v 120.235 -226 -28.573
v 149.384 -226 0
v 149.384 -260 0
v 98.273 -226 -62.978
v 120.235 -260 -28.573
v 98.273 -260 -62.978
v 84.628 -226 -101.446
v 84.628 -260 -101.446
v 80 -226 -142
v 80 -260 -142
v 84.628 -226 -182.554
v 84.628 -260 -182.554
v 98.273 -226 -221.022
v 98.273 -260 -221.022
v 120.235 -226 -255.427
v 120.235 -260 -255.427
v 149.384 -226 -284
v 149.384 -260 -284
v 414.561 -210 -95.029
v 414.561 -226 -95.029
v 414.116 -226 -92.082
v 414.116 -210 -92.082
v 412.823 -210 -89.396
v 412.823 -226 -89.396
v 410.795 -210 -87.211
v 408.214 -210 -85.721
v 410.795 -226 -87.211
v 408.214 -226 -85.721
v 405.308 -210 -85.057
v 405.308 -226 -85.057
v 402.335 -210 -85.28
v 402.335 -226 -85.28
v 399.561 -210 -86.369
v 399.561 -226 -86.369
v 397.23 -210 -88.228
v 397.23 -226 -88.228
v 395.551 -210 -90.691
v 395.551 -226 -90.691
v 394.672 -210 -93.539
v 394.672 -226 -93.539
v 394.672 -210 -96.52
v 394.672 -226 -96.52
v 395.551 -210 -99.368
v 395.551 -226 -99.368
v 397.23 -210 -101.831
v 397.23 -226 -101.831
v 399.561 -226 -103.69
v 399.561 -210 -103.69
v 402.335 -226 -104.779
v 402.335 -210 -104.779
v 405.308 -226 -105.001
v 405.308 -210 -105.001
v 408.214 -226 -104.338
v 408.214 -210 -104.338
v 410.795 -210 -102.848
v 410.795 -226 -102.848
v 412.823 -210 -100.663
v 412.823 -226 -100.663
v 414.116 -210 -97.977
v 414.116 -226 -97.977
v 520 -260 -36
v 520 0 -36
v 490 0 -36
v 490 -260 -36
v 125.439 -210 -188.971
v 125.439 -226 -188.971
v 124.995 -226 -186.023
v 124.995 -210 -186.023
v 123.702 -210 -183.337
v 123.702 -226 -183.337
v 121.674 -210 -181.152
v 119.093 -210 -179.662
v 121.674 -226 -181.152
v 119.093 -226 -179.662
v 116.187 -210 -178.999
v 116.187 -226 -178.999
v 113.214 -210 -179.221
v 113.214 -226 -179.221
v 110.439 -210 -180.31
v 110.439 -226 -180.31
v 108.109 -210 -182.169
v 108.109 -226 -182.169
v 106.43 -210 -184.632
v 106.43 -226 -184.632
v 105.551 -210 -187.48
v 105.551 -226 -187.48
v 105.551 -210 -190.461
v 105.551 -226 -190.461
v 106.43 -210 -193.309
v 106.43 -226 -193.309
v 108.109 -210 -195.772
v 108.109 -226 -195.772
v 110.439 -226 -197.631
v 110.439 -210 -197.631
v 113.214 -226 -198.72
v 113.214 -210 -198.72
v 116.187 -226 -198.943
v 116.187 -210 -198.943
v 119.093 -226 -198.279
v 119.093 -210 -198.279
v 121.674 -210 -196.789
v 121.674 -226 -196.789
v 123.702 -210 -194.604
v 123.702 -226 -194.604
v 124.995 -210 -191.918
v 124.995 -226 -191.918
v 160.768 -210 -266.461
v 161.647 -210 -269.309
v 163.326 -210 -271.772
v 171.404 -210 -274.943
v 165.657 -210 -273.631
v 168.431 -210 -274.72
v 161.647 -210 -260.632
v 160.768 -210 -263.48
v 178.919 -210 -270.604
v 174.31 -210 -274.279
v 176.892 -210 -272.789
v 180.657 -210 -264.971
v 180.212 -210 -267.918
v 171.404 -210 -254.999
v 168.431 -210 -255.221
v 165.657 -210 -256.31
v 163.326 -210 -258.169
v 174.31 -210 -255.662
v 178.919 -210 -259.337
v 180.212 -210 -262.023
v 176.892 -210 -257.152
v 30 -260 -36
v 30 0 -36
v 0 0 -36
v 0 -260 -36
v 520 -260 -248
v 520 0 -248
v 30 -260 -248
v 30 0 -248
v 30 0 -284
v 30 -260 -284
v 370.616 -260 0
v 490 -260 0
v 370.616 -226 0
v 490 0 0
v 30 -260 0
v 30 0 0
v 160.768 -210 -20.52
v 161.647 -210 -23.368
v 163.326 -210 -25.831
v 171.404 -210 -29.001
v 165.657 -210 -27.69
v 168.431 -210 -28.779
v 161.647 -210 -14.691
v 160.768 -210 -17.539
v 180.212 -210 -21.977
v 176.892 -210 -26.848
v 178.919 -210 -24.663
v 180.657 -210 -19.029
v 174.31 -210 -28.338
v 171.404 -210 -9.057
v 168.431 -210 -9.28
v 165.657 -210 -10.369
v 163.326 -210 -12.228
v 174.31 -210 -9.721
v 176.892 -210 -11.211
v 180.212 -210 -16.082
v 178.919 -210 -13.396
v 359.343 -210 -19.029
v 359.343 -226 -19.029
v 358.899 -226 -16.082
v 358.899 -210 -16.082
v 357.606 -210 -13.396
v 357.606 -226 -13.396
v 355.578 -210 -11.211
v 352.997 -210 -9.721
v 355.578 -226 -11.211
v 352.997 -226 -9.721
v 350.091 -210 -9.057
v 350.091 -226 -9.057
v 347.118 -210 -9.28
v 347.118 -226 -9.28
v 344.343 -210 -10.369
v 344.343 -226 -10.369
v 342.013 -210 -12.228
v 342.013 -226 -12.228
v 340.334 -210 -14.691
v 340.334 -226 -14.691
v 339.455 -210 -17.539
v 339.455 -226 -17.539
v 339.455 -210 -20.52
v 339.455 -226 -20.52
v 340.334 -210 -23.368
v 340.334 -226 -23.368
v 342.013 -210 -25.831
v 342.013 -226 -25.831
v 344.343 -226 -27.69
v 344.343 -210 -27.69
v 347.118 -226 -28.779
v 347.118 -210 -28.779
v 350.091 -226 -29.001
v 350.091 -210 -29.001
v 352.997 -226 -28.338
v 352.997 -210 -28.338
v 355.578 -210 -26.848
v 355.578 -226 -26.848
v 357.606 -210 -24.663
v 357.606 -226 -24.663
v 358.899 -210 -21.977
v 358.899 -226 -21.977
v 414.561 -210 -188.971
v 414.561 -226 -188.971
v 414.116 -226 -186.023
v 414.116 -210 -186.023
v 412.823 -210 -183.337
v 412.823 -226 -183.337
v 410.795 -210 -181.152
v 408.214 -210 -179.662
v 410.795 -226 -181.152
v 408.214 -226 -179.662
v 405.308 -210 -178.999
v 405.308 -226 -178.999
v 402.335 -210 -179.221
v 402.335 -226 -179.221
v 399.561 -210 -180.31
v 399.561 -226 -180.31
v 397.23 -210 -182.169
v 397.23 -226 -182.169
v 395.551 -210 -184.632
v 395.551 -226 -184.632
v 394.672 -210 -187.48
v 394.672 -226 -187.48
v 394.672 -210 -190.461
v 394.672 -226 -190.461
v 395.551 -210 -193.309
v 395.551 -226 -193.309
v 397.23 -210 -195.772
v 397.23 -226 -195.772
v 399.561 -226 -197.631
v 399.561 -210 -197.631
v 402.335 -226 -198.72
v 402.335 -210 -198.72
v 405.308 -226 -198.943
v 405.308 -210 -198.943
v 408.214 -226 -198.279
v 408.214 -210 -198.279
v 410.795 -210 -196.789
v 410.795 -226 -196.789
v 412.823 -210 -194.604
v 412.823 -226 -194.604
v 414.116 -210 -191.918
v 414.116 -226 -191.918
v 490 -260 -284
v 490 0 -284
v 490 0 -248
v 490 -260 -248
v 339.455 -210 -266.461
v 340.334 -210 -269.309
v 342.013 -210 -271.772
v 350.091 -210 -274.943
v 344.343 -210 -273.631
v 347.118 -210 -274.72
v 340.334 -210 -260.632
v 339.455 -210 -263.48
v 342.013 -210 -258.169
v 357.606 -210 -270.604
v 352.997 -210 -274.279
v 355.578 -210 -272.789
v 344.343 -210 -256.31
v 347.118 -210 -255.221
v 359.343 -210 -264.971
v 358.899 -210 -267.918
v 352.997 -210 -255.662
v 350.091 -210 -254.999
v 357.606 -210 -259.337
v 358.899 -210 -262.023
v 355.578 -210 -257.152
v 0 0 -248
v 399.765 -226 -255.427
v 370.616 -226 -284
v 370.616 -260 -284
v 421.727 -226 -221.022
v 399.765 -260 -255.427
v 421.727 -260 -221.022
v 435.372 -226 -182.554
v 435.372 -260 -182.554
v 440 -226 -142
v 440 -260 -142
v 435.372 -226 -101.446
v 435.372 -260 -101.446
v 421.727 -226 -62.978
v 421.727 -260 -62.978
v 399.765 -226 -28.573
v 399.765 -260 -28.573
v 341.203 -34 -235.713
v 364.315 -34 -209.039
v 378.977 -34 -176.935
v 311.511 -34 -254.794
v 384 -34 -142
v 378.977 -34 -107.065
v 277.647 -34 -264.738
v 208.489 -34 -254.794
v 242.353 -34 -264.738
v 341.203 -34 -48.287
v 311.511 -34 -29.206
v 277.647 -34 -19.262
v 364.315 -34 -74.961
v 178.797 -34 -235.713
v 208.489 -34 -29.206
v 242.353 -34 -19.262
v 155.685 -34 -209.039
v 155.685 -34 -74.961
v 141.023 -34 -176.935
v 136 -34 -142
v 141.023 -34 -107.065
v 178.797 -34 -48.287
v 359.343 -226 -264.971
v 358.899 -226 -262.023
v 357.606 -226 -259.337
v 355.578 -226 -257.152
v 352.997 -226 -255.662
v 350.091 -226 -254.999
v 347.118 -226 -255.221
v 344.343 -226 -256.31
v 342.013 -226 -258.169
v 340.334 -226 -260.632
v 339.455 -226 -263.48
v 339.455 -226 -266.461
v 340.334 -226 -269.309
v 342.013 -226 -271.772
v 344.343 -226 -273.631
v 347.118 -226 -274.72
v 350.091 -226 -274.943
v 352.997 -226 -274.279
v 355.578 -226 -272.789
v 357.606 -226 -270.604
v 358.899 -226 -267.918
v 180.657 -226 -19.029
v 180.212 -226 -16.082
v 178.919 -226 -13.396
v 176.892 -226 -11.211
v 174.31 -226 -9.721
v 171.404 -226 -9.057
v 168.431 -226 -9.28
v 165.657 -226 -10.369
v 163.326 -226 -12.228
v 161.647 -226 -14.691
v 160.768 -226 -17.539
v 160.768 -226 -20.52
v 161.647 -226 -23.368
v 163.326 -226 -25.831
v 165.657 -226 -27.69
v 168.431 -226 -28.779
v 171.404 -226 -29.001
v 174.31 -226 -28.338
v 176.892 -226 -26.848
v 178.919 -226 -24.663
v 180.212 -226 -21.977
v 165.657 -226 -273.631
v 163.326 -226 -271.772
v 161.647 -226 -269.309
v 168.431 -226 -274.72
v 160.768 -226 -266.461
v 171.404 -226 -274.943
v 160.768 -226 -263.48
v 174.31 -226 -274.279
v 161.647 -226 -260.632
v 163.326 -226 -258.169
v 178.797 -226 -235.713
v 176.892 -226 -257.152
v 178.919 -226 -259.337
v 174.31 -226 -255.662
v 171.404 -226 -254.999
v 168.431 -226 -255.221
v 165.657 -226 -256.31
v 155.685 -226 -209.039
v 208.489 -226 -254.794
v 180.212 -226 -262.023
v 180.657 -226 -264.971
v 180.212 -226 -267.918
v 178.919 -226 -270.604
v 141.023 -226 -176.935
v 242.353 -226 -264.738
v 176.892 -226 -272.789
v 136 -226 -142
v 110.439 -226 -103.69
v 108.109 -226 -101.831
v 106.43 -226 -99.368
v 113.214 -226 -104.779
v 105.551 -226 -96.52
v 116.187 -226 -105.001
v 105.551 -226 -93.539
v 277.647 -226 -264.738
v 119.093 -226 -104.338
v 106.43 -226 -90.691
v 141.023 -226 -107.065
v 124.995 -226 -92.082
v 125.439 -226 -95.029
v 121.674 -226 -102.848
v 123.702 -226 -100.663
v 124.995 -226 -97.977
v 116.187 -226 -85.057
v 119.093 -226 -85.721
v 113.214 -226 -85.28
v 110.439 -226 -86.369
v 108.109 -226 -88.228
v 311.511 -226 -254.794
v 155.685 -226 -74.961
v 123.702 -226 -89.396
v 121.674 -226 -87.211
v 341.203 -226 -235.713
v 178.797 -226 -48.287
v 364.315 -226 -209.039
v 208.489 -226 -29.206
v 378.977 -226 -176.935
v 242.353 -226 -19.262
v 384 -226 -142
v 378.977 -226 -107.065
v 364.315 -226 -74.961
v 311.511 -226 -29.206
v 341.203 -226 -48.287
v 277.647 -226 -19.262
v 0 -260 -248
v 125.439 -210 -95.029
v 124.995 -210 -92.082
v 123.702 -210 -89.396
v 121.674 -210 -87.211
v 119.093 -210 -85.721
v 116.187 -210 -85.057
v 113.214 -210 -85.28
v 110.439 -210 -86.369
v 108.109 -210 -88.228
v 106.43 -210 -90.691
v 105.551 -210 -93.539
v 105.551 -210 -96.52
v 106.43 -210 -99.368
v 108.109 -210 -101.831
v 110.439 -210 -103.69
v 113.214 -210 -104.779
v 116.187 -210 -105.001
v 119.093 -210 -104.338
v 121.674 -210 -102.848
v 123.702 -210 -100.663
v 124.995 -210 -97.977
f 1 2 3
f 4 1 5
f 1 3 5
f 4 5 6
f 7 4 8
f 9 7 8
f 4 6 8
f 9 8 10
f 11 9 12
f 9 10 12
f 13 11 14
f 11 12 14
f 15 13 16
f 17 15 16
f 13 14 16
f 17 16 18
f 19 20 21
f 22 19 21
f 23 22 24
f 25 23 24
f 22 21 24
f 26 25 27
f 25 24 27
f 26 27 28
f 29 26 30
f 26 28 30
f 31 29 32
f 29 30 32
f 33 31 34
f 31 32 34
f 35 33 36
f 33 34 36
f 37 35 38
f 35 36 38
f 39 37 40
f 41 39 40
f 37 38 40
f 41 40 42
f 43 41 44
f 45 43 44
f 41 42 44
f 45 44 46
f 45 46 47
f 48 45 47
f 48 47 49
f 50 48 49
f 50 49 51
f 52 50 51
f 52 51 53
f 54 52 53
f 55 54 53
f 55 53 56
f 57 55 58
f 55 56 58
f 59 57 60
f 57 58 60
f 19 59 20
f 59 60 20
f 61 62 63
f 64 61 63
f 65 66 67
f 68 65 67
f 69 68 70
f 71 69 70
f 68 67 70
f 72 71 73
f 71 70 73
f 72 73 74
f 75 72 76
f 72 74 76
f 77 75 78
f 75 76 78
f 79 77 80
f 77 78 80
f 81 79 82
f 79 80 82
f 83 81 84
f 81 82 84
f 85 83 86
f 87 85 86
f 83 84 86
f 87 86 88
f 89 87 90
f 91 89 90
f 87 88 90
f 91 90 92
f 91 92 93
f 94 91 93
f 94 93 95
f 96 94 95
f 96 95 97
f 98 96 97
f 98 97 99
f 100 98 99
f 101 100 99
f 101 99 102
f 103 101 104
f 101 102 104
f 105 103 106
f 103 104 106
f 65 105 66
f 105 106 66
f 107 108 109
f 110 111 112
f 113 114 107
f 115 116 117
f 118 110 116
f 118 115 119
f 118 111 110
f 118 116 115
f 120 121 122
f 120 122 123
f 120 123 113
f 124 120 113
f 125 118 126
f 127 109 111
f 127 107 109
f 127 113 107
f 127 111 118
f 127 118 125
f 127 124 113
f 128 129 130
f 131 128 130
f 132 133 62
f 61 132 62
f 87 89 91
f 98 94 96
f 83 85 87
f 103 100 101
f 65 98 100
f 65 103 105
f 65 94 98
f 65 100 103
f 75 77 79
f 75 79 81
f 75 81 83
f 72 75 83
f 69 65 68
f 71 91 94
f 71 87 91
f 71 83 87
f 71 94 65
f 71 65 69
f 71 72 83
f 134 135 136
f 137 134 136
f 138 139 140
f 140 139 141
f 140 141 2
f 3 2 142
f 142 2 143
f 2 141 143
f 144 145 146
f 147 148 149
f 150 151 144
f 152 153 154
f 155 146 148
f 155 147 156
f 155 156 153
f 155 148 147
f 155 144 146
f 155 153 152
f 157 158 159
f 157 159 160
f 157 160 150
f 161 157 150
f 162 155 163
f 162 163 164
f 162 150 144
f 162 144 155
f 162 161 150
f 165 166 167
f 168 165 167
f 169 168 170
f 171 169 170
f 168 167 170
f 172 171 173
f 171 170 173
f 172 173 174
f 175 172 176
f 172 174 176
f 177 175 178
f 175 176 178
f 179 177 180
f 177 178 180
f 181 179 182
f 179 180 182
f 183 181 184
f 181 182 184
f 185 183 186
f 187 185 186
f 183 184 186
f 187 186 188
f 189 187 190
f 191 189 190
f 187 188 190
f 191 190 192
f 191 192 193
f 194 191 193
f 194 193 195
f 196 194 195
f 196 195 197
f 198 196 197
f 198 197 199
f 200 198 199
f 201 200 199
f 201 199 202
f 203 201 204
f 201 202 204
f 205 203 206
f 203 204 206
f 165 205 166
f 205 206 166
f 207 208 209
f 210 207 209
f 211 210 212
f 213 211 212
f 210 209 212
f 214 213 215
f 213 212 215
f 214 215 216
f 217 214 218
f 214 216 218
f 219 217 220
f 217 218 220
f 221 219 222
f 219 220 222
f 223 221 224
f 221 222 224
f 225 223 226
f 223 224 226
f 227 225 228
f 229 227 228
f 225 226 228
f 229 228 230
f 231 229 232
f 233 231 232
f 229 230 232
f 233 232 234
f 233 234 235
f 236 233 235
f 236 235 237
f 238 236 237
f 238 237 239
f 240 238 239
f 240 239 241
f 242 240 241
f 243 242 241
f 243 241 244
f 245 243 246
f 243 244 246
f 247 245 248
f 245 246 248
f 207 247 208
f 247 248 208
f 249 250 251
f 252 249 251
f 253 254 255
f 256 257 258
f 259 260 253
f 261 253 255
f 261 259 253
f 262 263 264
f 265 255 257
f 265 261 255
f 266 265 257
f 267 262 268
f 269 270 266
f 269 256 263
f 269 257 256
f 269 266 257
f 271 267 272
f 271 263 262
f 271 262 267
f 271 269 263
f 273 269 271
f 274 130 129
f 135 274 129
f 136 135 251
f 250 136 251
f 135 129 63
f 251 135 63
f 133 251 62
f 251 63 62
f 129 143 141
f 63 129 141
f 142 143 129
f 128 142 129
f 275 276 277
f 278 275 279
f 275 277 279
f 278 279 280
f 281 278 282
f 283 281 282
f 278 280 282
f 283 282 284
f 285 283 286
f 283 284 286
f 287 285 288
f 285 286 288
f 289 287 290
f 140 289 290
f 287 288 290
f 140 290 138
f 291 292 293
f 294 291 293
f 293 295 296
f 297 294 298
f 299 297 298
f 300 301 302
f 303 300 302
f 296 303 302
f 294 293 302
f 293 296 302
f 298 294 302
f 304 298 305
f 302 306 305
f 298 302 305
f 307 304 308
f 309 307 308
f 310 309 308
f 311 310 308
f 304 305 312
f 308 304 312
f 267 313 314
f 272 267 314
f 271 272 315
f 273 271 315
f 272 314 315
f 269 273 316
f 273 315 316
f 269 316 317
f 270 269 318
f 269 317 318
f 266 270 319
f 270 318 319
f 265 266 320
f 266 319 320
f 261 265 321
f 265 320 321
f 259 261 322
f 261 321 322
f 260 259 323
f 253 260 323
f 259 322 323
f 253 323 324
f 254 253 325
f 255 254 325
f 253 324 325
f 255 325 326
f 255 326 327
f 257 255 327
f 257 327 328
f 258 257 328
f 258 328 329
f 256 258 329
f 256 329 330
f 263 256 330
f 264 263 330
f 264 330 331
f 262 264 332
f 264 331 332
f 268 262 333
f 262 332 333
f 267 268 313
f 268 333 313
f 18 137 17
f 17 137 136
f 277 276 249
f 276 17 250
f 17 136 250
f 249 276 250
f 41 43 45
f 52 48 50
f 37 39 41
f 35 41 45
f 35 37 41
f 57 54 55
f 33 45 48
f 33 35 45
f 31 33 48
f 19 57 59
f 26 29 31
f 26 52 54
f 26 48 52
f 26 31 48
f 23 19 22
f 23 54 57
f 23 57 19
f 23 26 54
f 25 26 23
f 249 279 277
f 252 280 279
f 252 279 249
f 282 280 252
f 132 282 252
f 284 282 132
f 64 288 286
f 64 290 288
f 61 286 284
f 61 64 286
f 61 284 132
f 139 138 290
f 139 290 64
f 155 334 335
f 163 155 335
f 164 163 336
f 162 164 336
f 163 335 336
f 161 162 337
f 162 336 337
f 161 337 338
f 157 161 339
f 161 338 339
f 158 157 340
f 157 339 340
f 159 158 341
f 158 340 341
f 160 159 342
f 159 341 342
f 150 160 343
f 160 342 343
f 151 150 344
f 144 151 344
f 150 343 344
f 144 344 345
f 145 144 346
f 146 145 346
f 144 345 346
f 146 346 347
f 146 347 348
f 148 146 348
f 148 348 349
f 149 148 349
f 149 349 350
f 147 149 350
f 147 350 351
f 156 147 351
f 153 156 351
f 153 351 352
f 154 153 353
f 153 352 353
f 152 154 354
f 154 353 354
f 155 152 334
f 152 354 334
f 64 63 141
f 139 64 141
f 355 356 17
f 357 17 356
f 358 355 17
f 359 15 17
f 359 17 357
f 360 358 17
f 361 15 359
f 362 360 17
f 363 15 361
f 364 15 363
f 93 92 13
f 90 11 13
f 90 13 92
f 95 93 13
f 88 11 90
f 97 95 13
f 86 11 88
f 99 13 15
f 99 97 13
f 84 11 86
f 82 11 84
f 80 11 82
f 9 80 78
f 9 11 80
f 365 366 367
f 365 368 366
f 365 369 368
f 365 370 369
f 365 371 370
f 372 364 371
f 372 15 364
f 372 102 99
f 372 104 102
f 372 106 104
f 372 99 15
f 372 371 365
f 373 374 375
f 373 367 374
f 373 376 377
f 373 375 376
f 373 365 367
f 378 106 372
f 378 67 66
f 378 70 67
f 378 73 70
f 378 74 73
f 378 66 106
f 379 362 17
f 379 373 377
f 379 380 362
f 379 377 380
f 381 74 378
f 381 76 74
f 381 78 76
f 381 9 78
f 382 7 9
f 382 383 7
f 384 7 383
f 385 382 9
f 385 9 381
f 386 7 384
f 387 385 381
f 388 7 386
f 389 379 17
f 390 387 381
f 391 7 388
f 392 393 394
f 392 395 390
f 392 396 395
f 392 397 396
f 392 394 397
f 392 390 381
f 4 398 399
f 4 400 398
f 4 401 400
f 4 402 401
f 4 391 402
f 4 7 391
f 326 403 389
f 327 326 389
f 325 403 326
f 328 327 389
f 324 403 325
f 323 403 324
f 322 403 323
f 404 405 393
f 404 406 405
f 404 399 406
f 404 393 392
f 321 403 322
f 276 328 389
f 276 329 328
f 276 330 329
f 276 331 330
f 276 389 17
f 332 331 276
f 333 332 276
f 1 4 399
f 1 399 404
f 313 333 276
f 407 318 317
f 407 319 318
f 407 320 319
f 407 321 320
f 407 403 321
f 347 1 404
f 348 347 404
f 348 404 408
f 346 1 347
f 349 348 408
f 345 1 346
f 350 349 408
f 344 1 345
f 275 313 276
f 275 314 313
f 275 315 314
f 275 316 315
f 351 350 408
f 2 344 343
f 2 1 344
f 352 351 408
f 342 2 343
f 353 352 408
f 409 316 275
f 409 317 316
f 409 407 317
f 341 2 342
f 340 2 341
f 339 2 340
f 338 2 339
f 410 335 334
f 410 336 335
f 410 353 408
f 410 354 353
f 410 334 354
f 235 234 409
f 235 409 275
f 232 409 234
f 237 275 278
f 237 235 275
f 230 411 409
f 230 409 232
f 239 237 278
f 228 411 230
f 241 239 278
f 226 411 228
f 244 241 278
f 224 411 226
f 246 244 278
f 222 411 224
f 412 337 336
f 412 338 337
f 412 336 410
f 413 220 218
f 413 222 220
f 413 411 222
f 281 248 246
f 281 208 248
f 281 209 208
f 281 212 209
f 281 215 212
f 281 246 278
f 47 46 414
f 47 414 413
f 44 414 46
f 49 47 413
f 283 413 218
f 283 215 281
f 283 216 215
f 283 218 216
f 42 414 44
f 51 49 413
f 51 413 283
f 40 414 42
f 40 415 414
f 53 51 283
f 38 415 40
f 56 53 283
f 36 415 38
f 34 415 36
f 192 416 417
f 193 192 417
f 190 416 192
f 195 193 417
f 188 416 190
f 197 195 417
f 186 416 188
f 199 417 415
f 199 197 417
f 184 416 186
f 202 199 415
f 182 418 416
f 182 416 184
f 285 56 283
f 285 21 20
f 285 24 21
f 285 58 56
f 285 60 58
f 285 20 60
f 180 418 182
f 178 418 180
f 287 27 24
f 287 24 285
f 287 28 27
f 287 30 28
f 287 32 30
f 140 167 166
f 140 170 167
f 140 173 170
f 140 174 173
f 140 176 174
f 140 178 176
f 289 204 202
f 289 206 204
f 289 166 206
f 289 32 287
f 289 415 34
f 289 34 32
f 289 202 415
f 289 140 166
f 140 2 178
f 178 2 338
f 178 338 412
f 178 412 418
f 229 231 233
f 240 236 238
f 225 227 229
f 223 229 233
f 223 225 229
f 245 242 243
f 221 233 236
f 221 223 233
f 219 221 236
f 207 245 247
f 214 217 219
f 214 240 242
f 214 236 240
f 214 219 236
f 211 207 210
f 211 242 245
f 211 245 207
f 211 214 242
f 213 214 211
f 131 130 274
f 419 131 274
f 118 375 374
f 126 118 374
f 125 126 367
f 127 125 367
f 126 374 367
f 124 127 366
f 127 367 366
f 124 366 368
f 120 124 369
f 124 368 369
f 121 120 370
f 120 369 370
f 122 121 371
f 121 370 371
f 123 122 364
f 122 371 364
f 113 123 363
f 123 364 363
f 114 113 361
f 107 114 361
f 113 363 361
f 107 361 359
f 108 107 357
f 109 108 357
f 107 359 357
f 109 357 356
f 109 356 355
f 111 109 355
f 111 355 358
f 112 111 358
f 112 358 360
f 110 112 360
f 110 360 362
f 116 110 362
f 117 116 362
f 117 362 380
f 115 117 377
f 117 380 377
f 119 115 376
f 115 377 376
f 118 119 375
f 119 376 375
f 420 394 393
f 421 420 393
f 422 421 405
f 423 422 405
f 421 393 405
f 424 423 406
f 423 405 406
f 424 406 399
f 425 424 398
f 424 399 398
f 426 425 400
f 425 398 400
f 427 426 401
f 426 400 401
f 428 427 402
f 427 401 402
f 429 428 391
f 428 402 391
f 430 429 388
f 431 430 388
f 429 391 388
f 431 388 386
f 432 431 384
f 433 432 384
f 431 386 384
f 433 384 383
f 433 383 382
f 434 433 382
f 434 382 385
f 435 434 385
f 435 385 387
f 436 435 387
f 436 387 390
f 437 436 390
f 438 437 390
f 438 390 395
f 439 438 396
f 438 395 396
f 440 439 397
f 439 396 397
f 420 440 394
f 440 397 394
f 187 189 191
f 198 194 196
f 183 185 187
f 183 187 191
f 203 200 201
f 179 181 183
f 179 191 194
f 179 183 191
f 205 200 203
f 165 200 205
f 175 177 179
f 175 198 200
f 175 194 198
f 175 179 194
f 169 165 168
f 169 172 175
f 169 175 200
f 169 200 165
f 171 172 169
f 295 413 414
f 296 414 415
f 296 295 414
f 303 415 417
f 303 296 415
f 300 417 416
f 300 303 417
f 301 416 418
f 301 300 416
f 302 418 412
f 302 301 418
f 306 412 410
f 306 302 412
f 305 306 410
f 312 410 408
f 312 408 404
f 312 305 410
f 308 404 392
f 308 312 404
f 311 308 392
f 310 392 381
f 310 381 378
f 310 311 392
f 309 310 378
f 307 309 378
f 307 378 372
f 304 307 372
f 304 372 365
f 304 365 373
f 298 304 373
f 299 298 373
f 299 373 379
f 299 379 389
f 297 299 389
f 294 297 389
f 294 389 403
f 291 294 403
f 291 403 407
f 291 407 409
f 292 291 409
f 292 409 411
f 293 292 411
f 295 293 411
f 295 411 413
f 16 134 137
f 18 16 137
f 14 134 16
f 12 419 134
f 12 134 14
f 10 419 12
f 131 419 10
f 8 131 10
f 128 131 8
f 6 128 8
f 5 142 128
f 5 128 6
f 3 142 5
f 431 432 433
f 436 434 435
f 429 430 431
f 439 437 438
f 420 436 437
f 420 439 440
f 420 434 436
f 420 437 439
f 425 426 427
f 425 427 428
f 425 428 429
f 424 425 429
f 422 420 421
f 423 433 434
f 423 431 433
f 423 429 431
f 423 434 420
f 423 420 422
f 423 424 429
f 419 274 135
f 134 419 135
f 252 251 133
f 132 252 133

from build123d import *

# Parameters (mm, degrees)
F0_R     = 124
F1_DEPTH = 260
F2_R     = 124
F3_DEPTH = 34
F4_R     = 124
F5_DEPTH = 34
F6_R     = 10
F7_DEPTH = 16


with BuildPart() as f1:
    # F0 (on Front) → F1 (new body)
    with BuildSketch(Plane.XZ):
        Polygon((490, 0), (30, 0), (30, -36), (0, -36), (0, -248), (30, -248), (30, -284), (490, -284), (490, -248), (520, -248), (520, -36), (490, -36), align=None)
        with Locations((260, -142)):
            Circle(F0_R, mode=Mode.SUBTRACT)
    extrude(amount=F1_DEPTH)

    # F2 (on face) → F3 (cut)
    with BuildSketch(Plane.XZ.offset(260)):
        with BuildLine():
            Line((149.3835455278, -284), (370.6164544722, -284))
            ThreePointArc((370.6164544722, -284), (440, -142), (370.6164544722, 0))
            Line((370.6164544722, 0), (149.3835455278, 0))
            ThreePointArc((149.3835455278, 0), (80, -142), (149.3835455278, -284))
        make_face()
        with Locations((260, -142)):
            Circle(F2_R, mode=Mode.SUBTRACT)
    extrude(amount=-F3_DEPTH, mode=Mode.SUBTRACT)

    # F4 (on face) → F5 (join)
    with BuildSketch(Plane(origin=(0, 0, 0), x_dir=(-1, 0, 0), z_dir=(0, 1, 0))):
        Polygon((-30, -36), (-30, 0), (-490, 0), (-490, -36), (-520, -36), (-520, -248), (-490, -248), (-490, -284), (-30, -284), (-30, -248), (0, -248), (0, -36), align=None)
        with Locations((-260, -142)):
            Circle(F4_R, mode=Mode.SUBTRACT)
        with Locations((-260, -142)):
            Circle(F4_R)
    extrude(amount=-F5_DEPTH)

    # F6 (on face) → F7 (cut)
    with BuildSketch(Plane.XZ.offset(226)):
        with Locations((170.6566416515, -19.029416855)):
            Circle(F6_R)
        with Locations((115.4394095231, -95.029416855)):
            Circle(F6_R)
        with Locations((115.4394095231, -188.970583145)):
            Circle(F6_R)
        with Locations((170.6566416515, -264.970583145)):
            Circle(F6_R)
        with Locations((349.3433583485, -264.970583145)):
            Circle(F6_R)
        with Locations((404.5605904769, -188.970583145)):
            Circle(F6_R)
        with Locations((404.5605904769, -95.029416855)):
            Circle(F6_R)
        with Locations((349.3433583485, -19.029416855)):
            Circle(F6_R)
    extrude(amount=-F7_DEPTH, mode=Mode.SUBTRACT)


solid = f1.part
